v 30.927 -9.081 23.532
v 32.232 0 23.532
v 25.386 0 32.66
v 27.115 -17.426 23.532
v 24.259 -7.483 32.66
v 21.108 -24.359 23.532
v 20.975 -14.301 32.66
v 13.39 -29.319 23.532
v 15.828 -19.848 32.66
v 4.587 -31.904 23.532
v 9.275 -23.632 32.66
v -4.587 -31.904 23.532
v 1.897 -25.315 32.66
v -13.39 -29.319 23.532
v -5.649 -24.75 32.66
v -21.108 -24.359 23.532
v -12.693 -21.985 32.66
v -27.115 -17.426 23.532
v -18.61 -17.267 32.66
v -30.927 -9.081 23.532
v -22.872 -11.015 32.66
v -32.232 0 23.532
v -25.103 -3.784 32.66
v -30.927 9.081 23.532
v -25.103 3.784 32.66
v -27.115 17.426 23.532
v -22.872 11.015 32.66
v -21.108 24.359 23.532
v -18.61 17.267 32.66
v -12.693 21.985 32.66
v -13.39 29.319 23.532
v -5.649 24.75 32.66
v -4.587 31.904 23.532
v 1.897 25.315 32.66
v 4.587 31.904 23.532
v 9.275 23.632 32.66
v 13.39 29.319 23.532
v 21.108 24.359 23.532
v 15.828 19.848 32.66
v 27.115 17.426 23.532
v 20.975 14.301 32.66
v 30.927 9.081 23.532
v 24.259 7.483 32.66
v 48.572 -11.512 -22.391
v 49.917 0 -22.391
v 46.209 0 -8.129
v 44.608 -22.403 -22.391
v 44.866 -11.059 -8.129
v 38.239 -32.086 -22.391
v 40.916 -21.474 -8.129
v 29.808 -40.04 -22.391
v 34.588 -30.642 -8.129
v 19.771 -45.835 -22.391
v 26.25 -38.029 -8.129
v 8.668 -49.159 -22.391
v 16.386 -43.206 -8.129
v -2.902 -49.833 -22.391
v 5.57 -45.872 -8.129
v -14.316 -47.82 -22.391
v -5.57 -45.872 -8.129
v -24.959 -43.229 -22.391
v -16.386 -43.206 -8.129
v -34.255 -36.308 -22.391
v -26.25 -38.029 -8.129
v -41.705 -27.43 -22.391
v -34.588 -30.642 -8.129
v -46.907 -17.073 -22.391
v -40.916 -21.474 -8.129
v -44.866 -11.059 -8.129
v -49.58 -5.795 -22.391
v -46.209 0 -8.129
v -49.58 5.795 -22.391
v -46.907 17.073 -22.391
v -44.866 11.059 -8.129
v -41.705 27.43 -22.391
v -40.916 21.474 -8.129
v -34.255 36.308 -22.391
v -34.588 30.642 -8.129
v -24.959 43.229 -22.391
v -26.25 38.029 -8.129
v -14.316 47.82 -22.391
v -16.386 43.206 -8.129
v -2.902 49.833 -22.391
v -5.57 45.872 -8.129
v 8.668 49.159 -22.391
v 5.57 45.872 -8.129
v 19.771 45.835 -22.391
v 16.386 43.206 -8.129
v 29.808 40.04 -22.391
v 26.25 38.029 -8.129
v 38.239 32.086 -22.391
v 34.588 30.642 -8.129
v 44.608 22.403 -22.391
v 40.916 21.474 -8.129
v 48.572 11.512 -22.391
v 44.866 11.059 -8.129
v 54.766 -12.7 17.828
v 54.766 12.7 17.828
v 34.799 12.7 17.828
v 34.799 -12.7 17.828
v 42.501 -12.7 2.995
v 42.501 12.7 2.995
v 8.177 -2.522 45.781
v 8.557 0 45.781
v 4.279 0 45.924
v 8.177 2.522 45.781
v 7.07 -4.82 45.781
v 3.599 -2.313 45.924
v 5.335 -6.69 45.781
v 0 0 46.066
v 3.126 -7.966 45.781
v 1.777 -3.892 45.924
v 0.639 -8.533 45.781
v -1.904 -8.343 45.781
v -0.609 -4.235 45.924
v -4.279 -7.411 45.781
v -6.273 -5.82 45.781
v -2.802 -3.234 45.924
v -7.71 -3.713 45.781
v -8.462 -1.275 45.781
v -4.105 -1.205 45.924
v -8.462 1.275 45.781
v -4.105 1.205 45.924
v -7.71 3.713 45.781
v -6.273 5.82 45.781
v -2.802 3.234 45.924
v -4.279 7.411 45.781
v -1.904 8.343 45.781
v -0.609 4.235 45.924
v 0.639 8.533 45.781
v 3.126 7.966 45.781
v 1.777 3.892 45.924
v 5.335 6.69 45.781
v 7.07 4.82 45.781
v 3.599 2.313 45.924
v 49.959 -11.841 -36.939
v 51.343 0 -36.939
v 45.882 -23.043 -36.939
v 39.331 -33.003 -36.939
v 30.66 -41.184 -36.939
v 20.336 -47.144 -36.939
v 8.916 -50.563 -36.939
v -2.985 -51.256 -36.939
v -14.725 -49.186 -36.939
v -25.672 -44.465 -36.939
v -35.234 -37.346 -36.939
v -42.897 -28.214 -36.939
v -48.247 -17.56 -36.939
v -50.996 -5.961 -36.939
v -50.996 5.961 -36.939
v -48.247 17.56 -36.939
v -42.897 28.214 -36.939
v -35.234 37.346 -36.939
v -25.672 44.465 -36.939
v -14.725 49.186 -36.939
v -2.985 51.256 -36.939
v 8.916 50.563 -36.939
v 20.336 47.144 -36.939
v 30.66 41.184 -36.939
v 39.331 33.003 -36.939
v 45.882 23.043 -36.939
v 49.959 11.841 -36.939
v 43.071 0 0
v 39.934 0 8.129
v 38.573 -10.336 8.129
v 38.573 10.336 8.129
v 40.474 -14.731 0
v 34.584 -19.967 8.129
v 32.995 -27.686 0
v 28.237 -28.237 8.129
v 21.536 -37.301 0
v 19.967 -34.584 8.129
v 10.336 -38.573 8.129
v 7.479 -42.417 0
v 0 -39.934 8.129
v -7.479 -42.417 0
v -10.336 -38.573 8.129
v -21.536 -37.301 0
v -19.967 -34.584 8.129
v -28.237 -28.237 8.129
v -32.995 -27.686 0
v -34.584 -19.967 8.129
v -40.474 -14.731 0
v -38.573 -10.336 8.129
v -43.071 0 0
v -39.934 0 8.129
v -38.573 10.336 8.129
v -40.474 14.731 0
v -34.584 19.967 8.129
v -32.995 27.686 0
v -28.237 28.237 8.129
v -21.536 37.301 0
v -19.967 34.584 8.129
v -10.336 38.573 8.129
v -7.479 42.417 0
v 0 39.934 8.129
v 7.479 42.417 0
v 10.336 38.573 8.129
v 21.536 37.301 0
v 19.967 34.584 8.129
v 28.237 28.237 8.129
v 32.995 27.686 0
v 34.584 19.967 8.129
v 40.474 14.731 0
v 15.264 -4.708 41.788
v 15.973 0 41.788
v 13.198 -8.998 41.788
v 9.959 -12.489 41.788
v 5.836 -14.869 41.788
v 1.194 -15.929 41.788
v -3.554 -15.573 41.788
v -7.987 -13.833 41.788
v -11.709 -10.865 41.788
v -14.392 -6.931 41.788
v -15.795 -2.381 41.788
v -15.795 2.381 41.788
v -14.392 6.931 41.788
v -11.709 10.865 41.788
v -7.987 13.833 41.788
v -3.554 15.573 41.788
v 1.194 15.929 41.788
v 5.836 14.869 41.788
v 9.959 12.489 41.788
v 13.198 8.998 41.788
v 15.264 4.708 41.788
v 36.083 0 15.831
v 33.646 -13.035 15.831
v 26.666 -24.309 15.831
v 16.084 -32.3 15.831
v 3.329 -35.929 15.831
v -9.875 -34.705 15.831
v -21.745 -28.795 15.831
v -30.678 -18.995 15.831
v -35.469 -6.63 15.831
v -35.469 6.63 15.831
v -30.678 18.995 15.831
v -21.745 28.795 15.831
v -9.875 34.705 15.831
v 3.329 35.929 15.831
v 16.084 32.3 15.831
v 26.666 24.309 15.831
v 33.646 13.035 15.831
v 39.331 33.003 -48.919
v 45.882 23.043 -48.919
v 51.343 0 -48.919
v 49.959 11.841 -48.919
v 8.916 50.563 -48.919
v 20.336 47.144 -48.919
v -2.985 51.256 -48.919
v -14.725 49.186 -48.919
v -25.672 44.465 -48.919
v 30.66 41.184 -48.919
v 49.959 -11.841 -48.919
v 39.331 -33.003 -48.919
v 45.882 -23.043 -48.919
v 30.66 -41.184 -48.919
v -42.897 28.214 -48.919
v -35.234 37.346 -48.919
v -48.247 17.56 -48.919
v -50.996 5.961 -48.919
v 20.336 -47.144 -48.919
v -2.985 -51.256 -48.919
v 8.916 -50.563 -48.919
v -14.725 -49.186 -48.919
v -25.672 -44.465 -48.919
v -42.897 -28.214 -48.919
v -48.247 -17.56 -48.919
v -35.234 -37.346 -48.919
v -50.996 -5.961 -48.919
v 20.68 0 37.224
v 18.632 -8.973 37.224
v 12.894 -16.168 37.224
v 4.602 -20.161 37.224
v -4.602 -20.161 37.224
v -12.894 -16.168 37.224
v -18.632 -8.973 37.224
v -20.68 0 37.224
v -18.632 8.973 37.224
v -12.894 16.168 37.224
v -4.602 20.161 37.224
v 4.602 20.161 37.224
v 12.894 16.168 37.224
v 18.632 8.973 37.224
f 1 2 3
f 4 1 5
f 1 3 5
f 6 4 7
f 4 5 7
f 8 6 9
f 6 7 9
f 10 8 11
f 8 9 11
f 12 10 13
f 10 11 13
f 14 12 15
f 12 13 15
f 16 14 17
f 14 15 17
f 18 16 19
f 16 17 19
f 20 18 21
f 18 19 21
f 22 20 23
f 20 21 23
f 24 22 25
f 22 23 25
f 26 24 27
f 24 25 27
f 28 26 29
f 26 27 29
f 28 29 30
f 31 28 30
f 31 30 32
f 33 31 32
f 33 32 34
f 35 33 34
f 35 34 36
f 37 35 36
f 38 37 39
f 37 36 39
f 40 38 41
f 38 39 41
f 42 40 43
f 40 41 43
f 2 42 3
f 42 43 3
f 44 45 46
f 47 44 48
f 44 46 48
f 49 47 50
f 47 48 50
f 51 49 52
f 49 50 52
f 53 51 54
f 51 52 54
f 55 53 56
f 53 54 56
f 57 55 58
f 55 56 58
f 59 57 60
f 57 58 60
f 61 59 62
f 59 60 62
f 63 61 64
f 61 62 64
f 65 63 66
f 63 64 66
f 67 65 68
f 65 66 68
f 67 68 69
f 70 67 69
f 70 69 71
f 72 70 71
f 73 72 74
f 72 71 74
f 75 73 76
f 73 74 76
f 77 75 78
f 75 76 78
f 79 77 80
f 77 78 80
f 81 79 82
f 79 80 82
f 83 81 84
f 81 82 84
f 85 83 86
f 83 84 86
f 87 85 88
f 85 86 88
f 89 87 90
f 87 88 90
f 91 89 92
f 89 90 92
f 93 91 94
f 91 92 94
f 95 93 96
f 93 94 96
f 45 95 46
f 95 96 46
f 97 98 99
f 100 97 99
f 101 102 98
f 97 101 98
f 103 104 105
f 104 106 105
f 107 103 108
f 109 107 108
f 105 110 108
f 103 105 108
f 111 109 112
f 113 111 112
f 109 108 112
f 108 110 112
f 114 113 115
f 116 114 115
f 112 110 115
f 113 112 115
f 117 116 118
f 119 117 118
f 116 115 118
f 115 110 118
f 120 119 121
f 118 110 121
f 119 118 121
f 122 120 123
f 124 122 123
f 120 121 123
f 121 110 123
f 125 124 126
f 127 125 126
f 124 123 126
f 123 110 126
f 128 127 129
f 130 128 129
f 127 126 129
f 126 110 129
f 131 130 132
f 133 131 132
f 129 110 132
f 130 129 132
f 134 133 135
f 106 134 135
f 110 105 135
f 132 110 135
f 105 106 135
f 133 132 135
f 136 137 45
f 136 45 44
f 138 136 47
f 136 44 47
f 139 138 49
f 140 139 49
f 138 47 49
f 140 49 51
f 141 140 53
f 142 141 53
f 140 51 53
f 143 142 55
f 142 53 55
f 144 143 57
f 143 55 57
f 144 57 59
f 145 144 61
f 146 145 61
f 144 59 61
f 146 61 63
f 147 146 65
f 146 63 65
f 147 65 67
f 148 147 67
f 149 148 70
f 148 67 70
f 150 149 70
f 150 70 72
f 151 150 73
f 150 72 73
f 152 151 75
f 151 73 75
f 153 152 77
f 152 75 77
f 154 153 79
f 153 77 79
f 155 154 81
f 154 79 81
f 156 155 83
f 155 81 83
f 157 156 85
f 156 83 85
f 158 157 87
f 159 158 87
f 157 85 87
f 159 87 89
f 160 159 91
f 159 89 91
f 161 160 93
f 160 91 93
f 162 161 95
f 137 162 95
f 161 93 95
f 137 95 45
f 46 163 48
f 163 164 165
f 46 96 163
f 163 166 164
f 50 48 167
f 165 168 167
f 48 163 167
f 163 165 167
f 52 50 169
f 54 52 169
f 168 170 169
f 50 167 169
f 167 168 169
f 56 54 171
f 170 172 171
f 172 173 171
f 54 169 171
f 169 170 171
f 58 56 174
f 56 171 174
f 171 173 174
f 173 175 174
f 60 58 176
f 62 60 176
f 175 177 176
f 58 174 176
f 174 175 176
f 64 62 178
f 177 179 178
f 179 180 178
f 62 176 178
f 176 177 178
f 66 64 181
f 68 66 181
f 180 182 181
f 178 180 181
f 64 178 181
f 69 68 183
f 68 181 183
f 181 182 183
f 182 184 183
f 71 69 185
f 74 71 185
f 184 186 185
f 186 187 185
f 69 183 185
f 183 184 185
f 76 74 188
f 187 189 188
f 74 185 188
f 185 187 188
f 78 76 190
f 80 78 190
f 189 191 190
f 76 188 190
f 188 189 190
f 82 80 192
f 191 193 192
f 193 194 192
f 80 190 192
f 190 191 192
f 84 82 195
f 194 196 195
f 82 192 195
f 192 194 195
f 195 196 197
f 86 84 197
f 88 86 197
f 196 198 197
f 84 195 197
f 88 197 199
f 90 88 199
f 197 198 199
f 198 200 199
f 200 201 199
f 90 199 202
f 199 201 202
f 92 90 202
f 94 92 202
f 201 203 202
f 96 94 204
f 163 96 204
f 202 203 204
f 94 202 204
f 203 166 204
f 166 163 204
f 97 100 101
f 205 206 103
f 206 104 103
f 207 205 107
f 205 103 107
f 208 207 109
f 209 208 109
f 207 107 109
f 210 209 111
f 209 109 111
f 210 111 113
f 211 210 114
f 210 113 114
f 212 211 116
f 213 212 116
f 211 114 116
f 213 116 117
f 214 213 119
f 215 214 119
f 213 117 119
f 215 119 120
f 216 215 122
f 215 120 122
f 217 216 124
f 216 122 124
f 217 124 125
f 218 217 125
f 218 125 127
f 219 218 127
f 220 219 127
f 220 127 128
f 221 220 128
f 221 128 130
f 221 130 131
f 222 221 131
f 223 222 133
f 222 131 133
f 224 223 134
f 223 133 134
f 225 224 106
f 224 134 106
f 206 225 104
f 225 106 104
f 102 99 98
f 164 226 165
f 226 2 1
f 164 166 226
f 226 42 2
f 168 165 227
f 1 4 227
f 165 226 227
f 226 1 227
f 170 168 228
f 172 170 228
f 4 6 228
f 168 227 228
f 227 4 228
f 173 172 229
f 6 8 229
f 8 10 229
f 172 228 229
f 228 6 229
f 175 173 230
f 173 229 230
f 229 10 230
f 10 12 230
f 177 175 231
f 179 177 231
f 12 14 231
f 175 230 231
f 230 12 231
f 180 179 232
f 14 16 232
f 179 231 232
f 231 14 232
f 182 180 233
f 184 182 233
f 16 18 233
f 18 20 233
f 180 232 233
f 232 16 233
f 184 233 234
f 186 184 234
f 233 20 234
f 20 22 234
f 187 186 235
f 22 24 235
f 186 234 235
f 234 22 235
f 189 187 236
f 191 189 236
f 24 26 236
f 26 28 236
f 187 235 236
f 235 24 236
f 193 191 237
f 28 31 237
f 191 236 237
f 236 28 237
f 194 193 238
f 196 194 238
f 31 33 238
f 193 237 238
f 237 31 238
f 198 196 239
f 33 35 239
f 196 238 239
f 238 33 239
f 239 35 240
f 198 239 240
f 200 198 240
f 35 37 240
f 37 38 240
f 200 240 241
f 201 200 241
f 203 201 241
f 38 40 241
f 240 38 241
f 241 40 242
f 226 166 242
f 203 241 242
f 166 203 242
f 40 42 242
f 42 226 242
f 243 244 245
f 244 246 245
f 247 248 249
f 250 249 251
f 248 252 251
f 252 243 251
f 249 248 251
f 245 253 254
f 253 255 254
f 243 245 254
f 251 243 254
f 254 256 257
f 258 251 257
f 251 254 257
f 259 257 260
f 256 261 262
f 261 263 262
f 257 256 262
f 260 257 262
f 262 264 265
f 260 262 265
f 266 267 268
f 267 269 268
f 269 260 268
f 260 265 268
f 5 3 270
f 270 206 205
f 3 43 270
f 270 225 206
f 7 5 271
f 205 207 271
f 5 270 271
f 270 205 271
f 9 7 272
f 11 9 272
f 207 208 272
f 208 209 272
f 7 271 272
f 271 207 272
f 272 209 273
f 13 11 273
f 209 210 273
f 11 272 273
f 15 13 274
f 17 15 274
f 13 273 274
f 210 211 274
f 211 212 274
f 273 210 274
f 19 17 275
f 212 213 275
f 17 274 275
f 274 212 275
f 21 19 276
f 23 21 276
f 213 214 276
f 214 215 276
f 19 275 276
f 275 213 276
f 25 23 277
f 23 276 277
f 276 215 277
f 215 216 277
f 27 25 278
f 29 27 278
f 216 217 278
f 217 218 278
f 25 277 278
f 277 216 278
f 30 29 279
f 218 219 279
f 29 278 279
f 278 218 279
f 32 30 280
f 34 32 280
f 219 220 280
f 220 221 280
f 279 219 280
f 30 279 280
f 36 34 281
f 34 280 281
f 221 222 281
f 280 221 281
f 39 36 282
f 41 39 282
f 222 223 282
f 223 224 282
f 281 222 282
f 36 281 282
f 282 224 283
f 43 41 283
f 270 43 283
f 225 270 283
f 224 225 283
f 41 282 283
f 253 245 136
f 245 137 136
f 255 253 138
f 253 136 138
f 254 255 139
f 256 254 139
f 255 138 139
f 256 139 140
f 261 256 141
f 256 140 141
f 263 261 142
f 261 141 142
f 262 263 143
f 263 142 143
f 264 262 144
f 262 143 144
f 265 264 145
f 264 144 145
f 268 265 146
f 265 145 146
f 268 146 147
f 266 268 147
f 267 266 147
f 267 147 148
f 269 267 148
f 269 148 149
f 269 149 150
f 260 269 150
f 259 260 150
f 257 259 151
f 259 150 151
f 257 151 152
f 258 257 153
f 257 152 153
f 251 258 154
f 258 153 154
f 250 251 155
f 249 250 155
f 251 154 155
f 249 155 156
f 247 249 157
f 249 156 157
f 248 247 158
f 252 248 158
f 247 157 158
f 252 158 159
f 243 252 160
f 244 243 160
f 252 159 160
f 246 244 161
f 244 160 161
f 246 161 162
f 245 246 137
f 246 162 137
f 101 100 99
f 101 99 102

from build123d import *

# Parameters (mm, degrees)
F3_DEPTH = 12.7


# Not quite as in the source:
# - the program builds the solid bodies; features that only make, move or delete a surface that nothing else refers to are left out


with BuildPart() as f1:
    # F0 (on Front) → F1 (revolve)
    with BuildSketch(Plane.XZ):
        Polygon((8.5572190583, 45.7811206579), (0, 46.0663624108), (0, -48.9187687635), (51.3433143497, -48.9187687635), (51.3433143497, -36.9386635721), (49.9171130359, -22.3913900554), (46.2089851499, -8.1293582916), (39.9336926639, 8.1293582916), (32.2321914136, 23.5323533416), (25.386415422, 32.6600521803), (15.973476693, 41.7877547443), align=None)
    revolve(axis=Axis((0, 0, -1.4262031764), (0, 0, -1)))


with BuildPart() as f3:
    # F2 (on Front) → F3 (new body, symmetric)
    with BuildSketch(Plane.XZ):
        Polygon((54.7662004828, 17.8275406361), (34.7993597388, 17.8275406361), (42.5008572638, 2.9950267635), align=None)
    extrude(amount=F3_DEPTH, both=True)


with BuildPart() as f3_1:
    # F5: moved
    add(f3.part)


solid = Compound([f1.part, f3_1.part])
